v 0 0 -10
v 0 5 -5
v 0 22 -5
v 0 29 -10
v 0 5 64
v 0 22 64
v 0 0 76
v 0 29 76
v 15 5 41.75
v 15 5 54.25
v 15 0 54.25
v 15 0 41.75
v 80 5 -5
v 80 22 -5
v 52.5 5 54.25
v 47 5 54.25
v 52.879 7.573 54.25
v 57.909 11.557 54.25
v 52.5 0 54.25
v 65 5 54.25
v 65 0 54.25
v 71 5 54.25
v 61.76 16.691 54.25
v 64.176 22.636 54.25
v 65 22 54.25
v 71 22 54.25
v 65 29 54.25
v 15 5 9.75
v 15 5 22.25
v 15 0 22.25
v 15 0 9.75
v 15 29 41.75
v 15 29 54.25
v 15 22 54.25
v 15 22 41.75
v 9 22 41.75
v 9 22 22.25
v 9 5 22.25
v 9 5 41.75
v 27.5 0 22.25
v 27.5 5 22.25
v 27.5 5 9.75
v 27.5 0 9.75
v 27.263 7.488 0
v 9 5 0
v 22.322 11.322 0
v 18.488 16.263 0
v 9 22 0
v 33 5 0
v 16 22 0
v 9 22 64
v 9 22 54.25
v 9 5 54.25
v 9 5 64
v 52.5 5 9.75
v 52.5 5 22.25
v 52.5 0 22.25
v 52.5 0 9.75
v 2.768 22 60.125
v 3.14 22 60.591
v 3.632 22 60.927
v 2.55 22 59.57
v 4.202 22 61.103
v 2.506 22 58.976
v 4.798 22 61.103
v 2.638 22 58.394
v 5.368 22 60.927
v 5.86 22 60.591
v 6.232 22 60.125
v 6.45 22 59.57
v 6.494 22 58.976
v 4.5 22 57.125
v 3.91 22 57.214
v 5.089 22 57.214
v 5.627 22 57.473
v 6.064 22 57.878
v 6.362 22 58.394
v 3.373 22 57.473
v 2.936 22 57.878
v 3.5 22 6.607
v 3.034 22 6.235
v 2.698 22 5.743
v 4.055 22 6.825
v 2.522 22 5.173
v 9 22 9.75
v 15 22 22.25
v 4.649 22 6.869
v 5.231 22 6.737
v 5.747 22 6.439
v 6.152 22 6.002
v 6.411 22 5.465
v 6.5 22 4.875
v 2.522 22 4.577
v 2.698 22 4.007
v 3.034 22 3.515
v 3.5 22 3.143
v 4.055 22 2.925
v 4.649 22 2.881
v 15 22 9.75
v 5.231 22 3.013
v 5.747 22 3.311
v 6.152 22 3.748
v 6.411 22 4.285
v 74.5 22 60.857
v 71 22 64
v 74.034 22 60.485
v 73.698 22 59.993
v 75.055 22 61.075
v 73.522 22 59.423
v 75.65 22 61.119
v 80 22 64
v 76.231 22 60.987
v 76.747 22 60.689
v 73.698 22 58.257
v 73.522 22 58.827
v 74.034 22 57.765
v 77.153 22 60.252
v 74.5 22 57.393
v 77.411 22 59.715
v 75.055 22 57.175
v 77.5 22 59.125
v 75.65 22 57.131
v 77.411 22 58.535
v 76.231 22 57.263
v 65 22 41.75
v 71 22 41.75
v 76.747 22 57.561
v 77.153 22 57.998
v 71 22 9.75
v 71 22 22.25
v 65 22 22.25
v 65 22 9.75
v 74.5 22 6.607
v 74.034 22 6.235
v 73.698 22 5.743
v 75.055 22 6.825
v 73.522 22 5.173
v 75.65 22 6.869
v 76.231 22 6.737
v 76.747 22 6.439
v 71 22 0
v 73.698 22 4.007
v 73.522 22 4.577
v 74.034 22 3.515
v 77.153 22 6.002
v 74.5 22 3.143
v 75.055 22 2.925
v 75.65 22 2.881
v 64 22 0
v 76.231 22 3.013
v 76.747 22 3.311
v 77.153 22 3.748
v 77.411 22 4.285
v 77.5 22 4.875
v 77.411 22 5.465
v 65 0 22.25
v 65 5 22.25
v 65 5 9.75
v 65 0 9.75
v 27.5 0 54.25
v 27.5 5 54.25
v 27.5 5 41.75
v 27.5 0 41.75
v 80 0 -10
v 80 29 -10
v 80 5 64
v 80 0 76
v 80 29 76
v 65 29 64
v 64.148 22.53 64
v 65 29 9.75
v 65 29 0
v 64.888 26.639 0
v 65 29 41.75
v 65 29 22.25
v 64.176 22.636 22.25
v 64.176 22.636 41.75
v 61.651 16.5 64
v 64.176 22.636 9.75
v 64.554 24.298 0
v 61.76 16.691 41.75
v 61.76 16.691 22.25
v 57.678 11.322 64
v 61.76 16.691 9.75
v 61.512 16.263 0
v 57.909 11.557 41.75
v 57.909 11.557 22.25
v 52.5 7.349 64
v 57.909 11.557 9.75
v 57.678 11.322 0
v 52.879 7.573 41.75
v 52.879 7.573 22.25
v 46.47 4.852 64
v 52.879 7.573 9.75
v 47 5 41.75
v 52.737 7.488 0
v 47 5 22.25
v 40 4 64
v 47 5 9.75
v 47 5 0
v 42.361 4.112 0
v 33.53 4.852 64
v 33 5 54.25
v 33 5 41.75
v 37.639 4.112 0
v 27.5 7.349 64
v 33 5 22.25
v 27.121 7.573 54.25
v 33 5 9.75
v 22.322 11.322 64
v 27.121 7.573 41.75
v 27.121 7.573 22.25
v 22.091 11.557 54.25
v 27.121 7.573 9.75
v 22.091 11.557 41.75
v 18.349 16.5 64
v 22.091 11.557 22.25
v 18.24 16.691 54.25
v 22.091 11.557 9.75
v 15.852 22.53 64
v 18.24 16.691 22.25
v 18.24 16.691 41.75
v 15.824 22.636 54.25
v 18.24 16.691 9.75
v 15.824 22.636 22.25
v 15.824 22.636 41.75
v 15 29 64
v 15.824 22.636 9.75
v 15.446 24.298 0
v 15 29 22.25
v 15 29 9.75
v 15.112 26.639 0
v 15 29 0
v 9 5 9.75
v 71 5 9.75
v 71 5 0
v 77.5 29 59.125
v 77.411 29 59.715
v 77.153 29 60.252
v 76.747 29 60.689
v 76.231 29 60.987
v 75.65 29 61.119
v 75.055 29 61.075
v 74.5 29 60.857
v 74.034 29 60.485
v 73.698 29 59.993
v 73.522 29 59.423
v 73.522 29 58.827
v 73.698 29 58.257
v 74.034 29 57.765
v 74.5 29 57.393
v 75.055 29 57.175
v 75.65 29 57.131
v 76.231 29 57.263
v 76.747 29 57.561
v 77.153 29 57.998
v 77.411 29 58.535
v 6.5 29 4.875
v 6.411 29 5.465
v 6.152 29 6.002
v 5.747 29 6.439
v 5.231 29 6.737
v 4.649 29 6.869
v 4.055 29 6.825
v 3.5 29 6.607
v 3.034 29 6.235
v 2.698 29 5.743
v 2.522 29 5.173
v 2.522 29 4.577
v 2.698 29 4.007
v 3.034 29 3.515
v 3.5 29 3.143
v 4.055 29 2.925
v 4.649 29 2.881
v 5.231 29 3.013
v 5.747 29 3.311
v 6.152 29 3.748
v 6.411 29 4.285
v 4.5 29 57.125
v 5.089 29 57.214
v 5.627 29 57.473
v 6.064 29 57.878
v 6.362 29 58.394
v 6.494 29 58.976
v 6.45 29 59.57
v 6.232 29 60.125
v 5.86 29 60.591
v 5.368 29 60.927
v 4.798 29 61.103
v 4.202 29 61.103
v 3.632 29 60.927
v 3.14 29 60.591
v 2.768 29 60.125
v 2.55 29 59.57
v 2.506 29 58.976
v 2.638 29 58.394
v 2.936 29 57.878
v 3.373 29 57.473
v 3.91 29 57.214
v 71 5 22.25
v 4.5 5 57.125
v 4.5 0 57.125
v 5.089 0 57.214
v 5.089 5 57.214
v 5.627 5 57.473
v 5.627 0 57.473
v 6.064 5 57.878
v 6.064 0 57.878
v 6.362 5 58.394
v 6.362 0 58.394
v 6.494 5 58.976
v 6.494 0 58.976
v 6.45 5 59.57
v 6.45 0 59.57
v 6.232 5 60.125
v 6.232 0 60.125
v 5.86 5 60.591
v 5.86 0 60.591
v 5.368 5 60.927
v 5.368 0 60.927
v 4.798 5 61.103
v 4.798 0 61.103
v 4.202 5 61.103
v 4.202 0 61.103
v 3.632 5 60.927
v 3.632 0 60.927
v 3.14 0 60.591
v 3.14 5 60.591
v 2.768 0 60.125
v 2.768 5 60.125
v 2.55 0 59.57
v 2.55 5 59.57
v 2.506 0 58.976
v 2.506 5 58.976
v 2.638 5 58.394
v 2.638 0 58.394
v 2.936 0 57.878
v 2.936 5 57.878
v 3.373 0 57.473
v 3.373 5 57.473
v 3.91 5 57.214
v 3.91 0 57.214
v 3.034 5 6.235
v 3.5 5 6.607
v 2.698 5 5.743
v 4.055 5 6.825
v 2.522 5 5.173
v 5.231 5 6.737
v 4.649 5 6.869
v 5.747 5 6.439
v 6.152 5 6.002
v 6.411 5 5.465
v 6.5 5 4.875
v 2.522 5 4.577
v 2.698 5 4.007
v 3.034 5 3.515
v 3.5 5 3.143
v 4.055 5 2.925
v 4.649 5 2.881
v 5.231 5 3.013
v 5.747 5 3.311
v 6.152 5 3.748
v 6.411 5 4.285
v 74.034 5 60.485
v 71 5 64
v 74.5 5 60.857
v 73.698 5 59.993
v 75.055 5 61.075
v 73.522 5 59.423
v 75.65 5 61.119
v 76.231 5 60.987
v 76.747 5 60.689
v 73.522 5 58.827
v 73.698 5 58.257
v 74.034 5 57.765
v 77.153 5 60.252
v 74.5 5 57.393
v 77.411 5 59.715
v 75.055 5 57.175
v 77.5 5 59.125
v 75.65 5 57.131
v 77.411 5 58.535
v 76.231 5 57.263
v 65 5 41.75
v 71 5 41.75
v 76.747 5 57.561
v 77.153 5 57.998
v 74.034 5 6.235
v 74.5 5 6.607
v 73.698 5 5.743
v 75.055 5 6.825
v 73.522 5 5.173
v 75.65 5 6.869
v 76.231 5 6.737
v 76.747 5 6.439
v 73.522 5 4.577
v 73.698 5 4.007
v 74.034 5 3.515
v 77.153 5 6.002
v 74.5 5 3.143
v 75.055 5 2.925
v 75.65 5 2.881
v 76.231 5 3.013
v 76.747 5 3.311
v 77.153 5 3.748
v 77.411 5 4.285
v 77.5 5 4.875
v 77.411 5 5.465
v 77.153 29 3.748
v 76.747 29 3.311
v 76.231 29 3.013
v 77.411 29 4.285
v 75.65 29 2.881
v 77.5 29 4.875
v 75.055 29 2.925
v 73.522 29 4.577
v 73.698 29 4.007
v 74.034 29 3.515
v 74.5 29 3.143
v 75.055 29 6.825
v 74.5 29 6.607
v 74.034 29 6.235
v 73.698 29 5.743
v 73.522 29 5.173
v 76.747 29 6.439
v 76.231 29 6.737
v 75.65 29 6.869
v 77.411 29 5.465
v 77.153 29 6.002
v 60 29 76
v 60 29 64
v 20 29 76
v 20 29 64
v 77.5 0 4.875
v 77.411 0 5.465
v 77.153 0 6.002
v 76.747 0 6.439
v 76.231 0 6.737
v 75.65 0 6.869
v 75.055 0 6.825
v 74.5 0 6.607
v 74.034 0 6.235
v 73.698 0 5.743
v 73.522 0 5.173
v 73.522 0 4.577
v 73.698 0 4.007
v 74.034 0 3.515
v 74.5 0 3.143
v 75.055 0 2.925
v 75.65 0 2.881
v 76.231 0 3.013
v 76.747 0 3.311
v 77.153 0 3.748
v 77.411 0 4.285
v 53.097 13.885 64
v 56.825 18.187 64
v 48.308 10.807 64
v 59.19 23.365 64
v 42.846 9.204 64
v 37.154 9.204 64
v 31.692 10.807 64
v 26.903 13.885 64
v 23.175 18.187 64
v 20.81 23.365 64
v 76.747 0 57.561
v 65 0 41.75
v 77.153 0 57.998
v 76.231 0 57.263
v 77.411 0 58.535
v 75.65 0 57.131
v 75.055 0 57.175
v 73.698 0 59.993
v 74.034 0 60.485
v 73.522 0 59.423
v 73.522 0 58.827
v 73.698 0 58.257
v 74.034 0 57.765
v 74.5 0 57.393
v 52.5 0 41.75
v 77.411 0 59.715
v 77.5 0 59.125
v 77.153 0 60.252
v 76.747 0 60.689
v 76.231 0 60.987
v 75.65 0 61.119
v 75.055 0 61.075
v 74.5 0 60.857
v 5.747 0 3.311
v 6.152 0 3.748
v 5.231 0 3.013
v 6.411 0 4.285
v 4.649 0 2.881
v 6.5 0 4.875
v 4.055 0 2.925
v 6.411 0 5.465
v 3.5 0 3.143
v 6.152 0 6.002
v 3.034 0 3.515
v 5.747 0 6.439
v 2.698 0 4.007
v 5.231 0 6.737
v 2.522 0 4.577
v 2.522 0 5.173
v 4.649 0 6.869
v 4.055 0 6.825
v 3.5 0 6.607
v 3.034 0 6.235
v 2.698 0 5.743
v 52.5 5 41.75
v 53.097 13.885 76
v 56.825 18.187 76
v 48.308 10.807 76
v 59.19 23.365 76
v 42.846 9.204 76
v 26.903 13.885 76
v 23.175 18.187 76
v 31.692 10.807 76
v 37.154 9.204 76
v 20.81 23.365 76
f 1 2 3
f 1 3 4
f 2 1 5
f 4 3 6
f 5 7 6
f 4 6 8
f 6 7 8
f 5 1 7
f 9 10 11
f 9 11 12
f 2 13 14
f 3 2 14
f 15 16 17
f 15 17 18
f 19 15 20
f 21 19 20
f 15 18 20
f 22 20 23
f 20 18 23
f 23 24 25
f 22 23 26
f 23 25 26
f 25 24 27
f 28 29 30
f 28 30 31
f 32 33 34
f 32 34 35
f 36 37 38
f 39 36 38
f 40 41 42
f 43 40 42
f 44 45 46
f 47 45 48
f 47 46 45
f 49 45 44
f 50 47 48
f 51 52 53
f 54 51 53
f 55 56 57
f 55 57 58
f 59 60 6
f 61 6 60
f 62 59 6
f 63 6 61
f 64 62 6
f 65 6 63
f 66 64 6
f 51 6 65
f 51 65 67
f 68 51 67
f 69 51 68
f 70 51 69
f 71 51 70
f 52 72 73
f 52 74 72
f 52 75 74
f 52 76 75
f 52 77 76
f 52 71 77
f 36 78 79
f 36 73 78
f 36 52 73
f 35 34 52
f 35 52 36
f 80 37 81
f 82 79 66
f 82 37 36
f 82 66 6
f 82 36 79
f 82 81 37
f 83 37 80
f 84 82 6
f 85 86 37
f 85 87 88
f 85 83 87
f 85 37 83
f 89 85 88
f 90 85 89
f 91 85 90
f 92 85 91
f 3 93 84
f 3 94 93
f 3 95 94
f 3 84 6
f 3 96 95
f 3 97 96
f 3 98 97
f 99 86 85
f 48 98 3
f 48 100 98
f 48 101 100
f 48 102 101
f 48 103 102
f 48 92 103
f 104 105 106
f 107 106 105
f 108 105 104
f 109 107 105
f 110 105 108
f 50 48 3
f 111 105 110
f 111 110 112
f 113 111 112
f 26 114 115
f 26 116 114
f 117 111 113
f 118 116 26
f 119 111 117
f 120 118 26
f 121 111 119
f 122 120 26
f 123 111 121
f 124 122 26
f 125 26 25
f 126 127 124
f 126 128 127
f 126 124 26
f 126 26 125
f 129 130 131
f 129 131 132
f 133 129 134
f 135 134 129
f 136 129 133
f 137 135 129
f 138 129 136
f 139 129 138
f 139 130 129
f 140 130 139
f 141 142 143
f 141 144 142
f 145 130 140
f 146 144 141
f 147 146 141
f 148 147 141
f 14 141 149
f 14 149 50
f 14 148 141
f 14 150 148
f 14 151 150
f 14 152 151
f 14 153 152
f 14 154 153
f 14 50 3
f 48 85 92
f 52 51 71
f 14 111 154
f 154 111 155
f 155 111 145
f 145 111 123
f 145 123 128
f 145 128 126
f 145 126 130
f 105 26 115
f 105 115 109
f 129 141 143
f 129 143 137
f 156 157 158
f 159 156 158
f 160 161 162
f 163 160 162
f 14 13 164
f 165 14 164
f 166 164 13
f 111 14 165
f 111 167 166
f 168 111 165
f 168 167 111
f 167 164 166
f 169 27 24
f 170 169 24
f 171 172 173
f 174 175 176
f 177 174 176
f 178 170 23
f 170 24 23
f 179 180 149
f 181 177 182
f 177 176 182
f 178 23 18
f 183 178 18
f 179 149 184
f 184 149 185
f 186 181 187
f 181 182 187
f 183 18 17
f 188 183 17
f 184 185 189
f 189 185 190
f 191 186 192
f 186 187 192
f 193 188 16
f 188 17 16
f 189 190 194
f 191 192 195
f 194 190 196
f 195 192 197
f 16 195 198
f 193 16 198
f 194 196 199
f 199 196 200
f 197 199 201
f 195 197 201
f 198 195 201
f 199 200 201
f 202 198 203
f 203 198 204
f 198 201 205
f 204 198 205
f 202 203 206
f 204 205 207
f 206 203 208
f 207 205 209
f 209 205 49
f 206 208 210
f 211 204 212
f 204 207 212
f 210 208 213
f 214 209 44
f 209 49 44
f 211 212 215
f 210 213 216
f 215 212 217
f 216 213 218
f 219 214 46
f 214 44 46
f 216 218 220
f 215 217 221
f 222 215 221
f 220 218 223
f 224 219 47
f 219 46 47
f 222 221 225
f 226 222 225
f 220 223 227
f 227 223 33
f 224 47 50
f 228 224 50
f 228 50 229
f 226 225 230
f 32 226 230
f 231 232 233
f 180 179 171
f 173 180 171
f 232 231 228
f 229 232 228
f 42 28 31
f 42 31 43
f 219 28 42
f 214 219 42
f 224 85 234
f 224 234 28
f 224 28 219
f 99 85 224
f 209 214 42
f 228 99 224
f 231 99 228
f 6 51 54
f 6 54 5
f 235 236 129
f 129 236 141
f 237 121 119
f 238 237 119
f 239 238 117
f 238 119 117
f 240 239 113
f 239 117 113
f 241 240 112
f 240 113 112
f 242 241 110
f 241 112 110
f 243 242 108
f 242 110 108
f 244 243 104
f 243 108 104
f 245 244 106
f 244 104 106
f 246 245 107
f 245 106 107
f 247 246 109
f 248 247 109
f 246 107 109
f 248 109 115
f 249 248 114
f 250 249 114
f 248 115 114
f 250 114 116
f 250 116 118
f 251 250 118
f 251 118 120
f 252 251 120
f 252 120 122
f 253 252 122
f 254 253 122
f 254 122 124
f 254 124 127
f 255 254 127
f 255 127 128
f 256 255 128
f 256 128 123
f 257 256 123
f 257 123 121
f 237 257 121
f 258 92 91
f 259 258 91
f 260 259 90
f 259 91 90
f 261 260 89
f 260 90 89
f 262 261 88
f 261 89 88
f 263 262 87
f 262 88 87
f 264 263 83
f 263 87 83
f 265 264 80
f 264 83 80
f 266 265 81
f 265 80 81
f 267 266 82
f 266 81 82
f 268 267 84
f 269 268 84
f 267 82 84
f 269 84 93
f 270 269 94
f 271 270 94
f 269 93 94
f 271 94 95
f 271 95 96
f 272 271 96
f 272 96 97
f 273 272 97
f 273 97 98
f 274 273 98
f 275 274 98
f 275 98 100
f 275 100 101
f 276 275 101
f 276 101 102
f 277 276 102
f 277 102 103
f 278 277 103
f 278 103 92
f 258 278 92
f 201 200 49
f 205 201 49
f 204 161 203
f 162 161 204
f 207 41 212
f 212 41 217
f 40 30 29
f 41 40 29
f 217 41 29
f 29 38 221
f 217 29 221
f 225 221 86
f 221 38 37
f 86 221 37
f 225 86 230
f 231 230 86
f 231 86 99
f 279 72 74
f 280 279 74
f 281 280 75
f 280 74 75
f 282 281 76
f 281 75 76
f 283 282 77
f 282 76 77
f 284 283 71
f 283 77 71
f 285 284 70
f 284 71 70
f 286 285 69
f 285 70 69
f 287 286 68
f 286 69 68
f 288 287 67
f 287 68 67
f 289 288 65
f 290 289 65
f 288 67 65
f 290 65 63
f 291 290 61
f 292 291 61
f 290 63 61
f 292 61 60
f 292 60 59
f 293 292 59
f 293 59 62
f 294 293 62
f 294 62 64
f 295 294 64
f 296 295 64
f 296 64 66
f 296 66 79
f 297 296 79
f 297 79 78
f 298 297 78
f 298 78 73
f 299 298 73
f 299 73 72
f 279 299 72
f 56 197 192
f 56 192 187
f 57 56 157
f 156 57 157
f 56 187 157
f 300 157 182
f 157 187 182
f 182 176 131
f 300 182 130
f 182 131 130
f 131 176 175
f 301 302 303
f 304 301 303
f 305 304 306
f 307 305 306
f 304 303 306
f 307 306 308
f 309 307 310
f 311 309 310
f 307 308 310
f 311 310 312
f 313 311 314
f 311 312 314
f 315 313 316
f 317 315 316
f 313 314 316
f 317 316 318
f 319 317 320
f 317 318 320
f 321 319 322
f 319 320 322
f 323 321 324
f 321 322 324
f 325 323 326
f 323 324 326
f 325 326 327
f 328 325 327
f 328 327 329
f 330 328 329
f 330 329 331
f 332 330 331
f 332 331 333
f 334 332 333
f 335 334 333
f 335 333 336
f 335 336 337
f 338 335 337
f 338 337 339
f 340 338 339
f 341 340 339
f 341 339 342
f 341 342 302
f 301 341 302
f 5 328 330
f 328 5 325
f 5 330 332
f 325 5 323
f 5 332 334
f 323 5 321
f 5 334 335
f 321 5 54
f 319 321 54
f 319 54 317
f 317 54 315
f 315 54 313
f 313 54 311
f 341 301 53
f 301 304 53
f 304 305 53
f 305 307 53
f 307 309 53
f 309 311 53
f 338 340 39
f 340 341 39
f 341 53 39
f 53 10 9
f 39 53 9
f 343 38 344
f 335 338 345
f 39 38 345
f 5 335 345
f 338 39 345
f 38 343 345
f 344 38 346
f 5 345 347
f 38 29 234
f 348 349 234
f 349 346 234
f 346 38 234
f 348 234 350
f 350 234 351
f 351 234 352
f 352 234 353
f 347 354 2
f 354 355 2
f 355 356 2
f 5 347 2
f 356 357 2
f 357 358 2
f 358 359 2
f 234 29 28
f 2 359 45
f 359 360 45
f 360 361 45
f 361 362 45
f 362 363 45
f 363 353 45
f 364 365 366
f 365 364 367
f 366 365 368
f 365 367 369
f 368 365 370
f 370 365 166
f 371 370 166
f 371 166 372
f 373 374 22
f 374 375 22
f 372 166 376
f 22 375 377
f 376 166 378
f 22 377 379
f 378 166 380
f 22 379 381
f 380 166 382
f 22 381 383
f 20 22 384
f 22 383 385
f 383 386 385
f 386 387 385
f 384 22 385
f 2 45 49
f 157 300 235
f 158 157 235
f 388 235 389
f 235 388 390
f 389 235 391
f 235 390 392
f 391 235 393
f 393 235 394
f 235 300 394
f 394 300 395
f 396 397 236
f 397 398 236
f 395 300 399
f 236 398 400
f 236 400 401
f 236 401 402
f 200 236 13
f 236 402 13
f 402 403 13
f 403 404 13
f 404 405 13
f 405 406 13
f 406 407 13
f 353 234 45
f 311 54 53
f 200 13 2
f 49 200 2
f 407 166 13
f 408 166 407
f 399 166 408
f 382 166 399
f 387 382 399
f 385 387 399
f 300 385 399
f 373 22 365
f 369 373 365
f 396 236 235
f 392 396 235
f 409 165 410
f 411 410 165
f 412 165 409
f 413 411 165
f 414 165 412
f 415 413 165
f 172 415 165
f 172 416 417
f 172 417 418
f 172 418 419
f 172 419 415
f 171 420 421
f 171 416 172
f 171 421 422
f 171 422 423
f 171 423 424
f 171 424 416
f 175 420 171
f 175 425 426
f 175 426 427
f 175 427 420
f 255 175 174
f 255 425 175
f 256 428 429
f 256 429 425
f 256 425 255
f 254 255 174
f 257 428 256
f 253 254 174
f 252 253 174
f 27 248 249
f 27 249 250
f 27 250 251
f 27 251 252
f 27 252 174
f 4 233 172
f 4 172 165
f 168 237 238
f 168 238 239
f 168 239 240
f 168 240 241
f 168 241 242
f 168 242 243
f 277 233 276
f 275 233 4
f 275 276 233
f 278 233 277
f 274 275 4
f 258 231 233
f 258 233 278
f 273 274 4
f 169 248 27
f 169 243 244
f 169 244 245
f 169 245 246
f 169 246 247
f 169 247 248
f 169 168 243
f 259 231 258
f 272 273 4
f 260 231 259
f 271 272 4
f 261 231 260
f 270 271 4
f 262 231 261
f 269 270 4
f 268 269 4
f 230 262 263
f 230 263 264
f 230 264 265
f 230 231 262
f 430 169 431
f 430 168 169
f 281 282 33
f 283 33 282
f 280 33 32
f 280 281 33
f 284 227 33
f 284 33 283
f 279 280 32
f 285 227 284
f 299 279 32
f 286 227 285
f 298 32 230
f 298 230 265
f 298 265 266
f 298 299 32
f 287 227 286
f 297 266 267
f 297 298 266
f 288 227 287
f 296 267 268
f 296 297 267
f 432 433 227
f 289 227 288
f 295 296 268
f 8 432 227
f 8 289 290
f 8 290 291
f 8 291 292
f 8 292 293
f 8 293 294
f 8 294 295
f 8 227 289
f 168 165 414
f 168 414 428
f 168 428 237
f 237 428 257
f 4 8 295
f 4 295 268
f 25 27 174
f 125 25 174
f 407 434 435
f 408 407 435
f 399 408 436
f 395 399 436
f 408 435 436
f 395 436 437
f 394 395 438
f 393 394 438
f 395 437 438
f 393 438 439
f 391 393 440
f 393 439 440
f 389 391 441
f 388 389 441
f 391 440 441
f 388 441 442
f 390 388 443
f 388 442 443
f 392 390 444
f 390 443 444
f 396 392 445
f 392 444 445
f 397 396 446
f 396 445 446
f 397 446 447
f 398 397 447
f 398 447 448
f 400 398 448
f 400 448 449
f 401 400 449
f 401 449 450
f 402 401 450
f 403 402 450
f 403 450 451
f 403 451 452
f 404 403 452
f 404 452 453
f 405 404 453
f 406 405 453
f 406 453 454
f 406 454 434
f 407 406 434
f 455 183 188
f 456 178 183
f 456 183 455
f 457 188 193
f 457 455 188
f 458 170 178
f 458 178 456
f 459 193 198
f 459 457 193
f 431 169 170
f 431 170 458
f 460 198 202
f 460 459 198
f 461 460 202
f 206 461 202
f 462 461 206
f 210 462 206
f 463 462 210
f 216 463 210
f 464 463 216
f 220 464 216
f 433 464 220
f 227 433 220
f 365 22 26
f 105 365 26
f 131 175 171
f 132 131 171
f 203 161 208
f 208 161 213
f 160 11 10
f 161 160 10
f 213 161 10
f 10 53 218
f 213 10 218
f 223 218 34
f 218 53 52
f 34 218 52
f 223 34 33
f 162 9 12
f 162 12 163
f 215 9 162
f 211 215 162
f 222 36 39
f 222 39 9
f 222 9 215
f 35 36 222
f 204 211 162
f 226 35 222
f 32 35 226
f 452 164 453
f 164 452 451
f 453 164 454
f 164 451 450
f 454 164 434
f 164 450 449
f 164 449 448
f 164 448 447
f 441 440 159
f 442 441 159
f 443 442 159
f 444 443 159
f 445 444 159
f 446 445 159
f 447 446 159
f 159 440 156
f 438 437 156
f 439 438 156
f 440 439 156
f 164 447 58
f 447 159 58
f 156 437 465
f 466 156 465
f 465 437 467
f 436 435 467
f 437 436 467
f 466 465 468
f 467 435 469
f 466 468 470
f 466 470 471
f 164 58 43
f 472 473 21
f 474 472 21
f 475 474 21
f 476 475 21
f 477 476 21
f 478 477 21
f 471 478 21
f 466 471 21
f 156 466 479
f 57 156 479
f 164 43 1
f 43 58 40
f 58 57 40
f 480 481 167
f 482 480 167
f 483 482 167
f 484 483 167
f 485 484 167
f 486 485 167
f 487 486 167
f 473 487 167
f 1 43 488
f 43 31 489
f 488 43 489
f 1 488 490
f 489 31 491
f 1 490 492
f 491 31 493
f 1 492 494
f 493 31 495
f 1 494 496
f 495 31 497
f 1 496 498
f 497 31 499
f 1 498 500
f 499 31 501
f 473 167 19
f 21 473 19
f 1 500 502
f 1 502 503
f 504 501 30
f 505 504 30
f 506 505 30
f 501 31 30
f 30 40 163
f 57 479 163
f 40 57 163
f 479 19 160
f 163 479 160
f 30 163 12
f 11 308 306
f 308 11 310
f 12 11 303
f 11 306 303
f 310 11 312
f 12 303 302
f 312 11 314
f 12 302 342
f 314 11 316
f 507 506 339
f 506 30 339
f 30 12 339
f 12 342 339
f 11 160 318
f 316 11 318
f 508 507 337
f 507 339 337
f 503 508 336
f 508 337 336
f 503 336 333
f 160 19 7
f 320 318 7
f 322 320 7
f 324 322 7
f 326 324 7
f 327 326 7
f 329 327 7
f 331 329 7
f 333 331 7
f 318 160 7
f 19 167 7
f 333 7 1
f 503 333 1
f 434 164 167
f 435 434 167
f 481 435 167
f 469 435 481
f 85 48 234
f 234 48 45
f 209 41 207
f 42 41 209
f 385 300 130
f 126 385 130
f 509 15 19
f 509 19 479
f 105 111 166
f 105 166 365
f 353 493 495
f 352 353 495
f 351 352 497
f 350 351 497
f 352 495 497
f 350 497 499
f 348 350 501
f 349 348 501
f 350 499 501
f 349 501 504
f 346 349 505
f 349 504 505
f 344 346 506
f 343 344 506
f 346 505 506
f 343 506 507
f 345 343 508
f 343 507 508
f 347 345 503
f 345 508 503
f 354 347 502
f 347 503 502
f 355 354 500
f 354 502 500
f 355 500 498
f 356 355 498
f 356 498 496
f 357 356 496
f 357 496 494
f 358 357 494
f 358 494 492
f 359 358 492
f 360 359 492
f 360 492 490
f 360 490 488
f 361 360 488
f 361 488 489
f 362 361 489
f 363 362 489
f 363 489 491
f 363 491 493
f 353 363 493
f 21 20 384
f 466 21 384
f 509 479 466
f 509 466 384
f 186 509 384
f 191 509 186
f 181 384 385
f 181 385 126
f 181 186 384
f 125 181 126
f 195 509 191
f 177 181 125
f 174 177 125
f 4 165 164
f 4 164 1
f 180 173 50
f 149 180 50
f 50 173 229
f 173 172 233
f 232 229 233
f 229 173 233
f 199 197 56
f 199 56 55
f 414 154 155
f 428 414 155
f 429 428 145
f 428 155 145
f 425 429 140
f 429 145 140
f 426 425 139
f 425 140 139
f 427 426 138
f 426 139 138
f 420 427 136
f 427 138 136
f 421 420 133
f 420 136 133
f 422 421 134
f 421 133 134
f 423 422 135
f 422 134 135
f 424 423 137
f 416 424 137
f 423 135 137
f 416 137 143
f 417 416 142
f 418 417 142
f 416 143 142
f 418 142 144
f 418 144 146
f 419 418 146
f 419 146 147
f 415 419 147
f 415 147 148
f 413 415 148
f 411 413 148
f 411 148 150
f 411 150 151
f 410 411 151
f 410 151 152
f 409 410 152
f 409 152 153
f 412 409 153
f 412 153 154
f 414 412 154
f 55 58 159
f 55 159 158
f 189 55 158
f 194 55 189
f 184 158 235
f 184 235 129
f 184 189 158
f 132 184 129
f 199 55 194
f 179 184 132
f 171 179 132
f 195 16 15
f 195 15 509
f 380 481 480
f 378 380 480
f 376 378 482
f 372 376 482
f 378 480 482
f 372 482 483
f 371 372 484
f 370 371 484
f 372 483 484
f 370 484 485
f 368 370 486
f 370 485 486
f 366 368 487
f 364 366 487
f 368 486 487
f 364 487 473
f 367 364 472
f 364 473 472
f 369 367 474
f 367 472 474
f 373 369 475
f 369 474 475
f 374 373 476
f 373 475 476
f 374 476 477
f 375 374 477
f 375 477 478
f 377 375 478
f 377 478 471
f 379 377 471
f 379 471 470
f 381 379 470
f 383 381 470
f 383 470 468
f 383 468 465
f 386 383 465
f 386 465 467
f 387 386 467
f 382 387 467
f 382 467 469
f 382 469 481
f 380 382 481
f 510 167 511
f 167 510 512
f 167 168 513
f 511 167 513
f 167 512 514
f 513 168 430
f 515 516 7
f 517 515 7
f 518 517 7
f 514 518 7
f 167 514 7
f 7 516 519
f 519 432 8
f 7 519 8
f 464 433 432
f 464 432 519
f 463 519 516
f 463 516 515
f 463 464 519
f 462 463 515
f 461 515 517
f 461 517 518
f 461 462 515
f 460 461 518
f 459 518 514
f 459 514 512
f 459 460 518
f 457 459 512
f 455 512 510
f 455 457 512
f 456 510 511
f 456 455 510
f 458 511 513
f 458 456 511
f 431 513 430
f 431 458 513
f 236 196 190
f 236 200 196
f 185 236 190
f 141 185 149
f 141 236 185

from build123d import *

# Parameters (mm, degrees)
BOSS_EXTRUDE1_DEPTH            = 64
BOSS_EXTRUDE2_DEPTH            = 12
SKETCH3_W                      = 12.5
SKETCH3_H                      = 12.5
CUT_EXTRUDE1_DEPTH             = 29
CUT_EXTRUDE2_REACH             = 106.125
SKETCH5_W                      = 12.5
SKETCH5_H                      = 17
CUT_EXTRUDE2_DIRECTION_2_REACH = 106.125
CUT_EXTRUDE3_REACH             = 116.092
SKETCH6_R                      = 2
SKETCH7_W                      = 80
SKETCH7_H                      = 29
BOSS_EXTRUDE3_DEPTH            = 10
SKETCH8_W                      = 5
SKETCH8_H                      = 17
CUT_EXTRUDE4_DEPTH             = 80


with BuildPart() as part:
    # Sketch1 → Boss-Extrude1 (new body)
    with BuildSketch(Plane.XY):
        with BuildLine():
            Line((0, 0), (80, 0))
            Line((80, 0), (80, 5))
            Line((80, 5), (71, 5))
            Line((71, 5), (71, 22))
            Line((71, 22), (80, 22))
            Line((80, 22), (80, 29))
            Line((80, 29), (65, 29))
            ThreePointArc((65, 29), (40, 4), (15, 29))
            Line((15, 29), (0, 29))
            Line((0, 29), (0, 22))
            Line((0, 22), (9, 22))
            Line((9, 22), (9, 5))
            Line((9, 5), (0, 5))
            Line((0, 5), (0, 0))
        make_face()
    extrude(amount=BOSS_EXTRUDE1_DEPTH)

    # Sketch2 → Boss-Extrude2 (add)
    with BuildSketch(Plane.XY.offset(64)):
        with BuildLine():
            Line((60, 29), (80, 29))
            Line((80, 29), (80, 0))
            Line((80, 0), (0, 0))
            Line((0, 0), (0, 29))
            Line((0, 29), (20, 29))
            ThreePointArc((20, 29), (40, 9), (60, 29))
        make_face()
    extrude(amount=BOSS_EXTRUDE2_DEPTH)

    # Sketch3 → Cut-Extrude1 (cut)
    with BuildSketch(Plane(origin=(0, 29, 0), x_dir=(1, 0, 0), z_dir=(0, 1, 0))):
        with Locations((21.25, -16)):
            Rectangle(SKETCH3_W, SKETCH3_H)
        with Locations((58.75, -16)):
            Rectangle(SKETCH3_W, SKETCH3_H)
        with Locations((21.25, -48)):
            Rectangle(SKETCH3_W, SKETCH3_H)
        with Locations((58.75, -48)):
            Rectangle(SKETCH3_W, SKETCH3_H)
    extrude(amount=-CUT_EXTRUDE1_DEPTH, mode=Mode.SUBTRACT)

    # Cut-Extrude2: up to this face of the body (flat: up to its plane)
    cut_extrude2_end = Plane(part.part.faces().sort_by_distance((9, 13.5, 32))[0])
    # Sketch5 → Cut-Extrude2 (cut, up to the picked face)
    with BuildSketch(Plane(origin=(15, 0, 0), x_dir=(0, 0, -1), z_dir=(1, 0, 0)), mode=Mode.PRIVATE) as cut_extrude2_sk1:
        with Locations((-48, 13.5)):
            Rectangle(SKETCH5_W, SKETCH5_H)
    cut_extrude2_tool1 = split(extrude(cut_extrude2_sk1.sketch, amount=-CUT_EXTRUDE2_REACH, mode=Mode.PRIVATE), bisect_by=cut_extrude2_end, keep=Keep.BOTH, mode=Mode.PRIVATE)
    # Sketch5 → Cut-Extrude2 (cut, up to the picked face)
    with BuildSketch(Plane(origin=(15, 0, 0), x_dir=(0, 0, -1), z_dir=(1, 0, 0)), mode=Mode.PRIVATE) as cut_extrude2_sk2:
        with Locations((-16, 13.5)):
            Rectangle(SKETCH5_W, SKETCH5_H)
    cut_extrude2_tool2 = split(extrude(cut_extrude2_sk2.sketch, amount=-CUT_EXTRUDE2_REACH, mode=Mode.PRIVATE), bisect_by=cut_extrude2_end, keep=Keep.BOTH, mode=Mode.PRIVATE)
    add(cut_extrude2_tool1.solids().sort_by(Axis((15, 13.5, 48), (-1, 0, 0)))[0], mode=Mode.SUBTRACT)
    add(cut_extrude2_tool2.solids().sort_by(Axis((15, 13.5, 16), (-1, 0, 0)))[0], mode=Mode.SUBTRACT)

    # Cut-Extrude2 direction 2: up to this face of the body (flat: up to its plane)
    cut_extrude2_direction_2_end = Plane(part.part.faces().sort_by_distance((71, 13.5, 32))[0])
    # Sketch5 → Cut-Extrude2 direction 2 (cut, up to the picked face)
    with BuildSketch(Plane(origin=(15, 0, 0), x_dir=(0, 0, -1), z_dir=(1, 0, 0)), mode=Mode.PRIVATE) as cut_extrude2_direction_2_sk1:
        with Locations((-48, 13.5)):
            Rectangle(SKETCH5_W, SKETCH5_H)
    cut_extrude2_direction_2_tool1 = split(extrude(cut_extrude2_direction_2_sk1.sketch, amount=CUT_EXTRUDE2_DIRECTION_2_REACH, mode=Mode.PRIVATE), bisect_by=cut_extrude2_direction_2_end, keep=Keep.BOTH, mode=Mode.PRIVATE)
    # Sketch5 → Cut-Extrude2 direction 2 (cut, up to the picked face)
    with BuildSketch(Plane(origin=(15, 0, 0), x_dir=(0, 0, -1), z_dir=(1, 0, 0)), mode=Mode.PRIVATE) as cut_extrude2_direction_2_sk2:
        with Locations((-16, 13.5)):
            Rectangle(SKETCH5_W, SKETCH5_H)
    cut_extrude2_direction_2_tool2 = split(extrude(cut_extrude2_direction_2_sk2.sketch, amount=CUT_EXTRUDE2_DIRECTION_2_REACH, mode=Mode.PRIVATE), bisect_by=cut_extrude2_direction_2_end, keep=Keep.BOTH, mode=Mode.PRIVATE)
    add(cut_extrude2_direction_2_tool1.solids().sort_by(Axis((15, 13.5, 48), (1, 0, 0)))[0], mode=Mode.SUBTRACT)
    add(cut_extrude2_direction_2_tool2.solids().sort_by(Axis((15, 13.5, 16), (1, 0, 0)))[0], mode=Mode.SUBTRACT)

    # Cut-Extrude3: up to this face of the body (flat: up to its plane)
    cut_extrude3_end = Plane(part.part.faces().sort_by_distance((72, 29, 39.6))[0])
    # Sketch6 → Cut-Extrude3 (cut, up to the picked face)
    with BuildSketch(Plane(origin=(0, 0, 0), x_dir=(-1, 0, 0), z_dir=(0, -1, 0)), mode=Mode.PRIVATE) as cut_extrude3_sk1:
        with Locations(Location((-4.499910861, -59.125, 0), (0, 0, 90))):
            Circle(SKETCH6_R)
    cut_extrude3_tool1 = split(extrude(cut_extrude3_sk1.sketch, amount=-CUT_EXTRUDE3_REACH, mode=Mode.PRIVATE), bisect_by=cut_extrude3_end, keep=Keep.BOTH, mode=Mode.PRIVATE)
    # Sketch6 → Cut-Extrude3 (cut, up to the picked face)
    with BuildSketch(Plane(origin=(0, 0, 0), x_dir=(-1, 0, 0), z_dir=(0, -1, 0)), mode=Mode.PRIVATE) as cut_extrude3_sk2:
        with Locations(Location((-4.499910861, -4.875, 0), (0, 0, 180))):
            Circle(SKETCH6_R)
    cut_extrude3_tool2 = split(extrude(cut_extrude3_sk2.sketch, amount=-CUT_EXTRUDE3_REACH, mode=Mode.PRIVATE), bisect_by=cut_extrude3_end, keep=Keep.BOTH, mode=Mode.PRIVATE)
    # Sketch6 → Cut-Extrude3 (cut, up to the picked face)
    with BuildSketch(Plane(origin=(0, 0, 0), x_dir=(-1, 0, 0), z_dir=(0, -1, 0)), mode=Mode.PRIVATE) as cut_extrude3_sk3:
        with Locations(Location((-75.500089139, -4.875, 0), (0, 0, 180))):
            Circle(SKETCH6_R)
    cut_extrude3_tool3 = split(extrude(cut_extrude3_sk3.sketch, amount=-CUT_EXTRUDE3_REACH, mode=Mode.PRIVATE), bisect_by=cut_extrude3_end, keep=Keep.BOTH, mode=Mode.PRIVATE)
    # Sketch6 → Cut-Extrude3 (cut, up to the picked face)
    with BuildSketch(Plane(origin=(0, 0, 0), x_dir=(-1, 0, 0), z_dir=(0, -1, 0)), mode=Mode.PRIVATE) as cut_extrude3_sk4:
        with Locations(Location((-75.500089139, -59.125, 0), (0, 0, 180))):
            Circle(SKETCH6_R)
    cut_extrude3_tool4 = split(extrude(cut_extrude3_sk4.sketch, amount=-CUT_EXTRUDE3_REACH, mode=Mode.PRIVATE), bisect_by=cut_extrude3_end, keep=Keep.BOTH, mode=Mode.PRIVATE)
    add(cut_extrude3_tool1.solids().sort_by(Axis((4.499911, 0, 59.125), (0, 1, 0)))[0], mode=Mode.SUBTRACT)
    add(cut_extrude3_tool2.solids().sort_by(Axis((4.499911, 0, 4.875), (0, 1, 0)))[0], mode=Mode.SUBTRACT)
    add(cut_extrude3_tool3.solids().sort_by(Axis((75.500089, 0, 4.875), (0, 1, 0)))[0], mode=Mode.SUBTRACT)
    add(cut_extrude3_tool4.solids().sort_by(Axis((75.500089, 0, 59.125), (0, 1, 0)))[0], mode=Mode.SUBTRACT)

    # Sketch7 → Boss-Extrude3 (add)
    with BuildSketch(Plane(origin=(0, 0, 0), x_dir=(-1, 0, 0), z_dir=(0, 0, -1))):
        with Locations((-40, 14.5)):
            Rectangle(SKETCH7_W, SKETCH7_H)
    extrude(amount=BOSS_EXTRUDE3_DEPTH)

    # Sketch8 → Cut-Extrude4 (cut)
    with BuildSketch(Plane(origin=(80, 0, 0), x_dir=(0, 0, -1), z_dir=(1, 0, 0))):
        with Locations((2.5, 13.5)):
            Rectangle(SKETCH8_W, SKETCH8_H)
    extrude(amount=-CUT_EXTRUDE4_DEPTH, mode=Mode.SUBTRACT)


solid = part.part
